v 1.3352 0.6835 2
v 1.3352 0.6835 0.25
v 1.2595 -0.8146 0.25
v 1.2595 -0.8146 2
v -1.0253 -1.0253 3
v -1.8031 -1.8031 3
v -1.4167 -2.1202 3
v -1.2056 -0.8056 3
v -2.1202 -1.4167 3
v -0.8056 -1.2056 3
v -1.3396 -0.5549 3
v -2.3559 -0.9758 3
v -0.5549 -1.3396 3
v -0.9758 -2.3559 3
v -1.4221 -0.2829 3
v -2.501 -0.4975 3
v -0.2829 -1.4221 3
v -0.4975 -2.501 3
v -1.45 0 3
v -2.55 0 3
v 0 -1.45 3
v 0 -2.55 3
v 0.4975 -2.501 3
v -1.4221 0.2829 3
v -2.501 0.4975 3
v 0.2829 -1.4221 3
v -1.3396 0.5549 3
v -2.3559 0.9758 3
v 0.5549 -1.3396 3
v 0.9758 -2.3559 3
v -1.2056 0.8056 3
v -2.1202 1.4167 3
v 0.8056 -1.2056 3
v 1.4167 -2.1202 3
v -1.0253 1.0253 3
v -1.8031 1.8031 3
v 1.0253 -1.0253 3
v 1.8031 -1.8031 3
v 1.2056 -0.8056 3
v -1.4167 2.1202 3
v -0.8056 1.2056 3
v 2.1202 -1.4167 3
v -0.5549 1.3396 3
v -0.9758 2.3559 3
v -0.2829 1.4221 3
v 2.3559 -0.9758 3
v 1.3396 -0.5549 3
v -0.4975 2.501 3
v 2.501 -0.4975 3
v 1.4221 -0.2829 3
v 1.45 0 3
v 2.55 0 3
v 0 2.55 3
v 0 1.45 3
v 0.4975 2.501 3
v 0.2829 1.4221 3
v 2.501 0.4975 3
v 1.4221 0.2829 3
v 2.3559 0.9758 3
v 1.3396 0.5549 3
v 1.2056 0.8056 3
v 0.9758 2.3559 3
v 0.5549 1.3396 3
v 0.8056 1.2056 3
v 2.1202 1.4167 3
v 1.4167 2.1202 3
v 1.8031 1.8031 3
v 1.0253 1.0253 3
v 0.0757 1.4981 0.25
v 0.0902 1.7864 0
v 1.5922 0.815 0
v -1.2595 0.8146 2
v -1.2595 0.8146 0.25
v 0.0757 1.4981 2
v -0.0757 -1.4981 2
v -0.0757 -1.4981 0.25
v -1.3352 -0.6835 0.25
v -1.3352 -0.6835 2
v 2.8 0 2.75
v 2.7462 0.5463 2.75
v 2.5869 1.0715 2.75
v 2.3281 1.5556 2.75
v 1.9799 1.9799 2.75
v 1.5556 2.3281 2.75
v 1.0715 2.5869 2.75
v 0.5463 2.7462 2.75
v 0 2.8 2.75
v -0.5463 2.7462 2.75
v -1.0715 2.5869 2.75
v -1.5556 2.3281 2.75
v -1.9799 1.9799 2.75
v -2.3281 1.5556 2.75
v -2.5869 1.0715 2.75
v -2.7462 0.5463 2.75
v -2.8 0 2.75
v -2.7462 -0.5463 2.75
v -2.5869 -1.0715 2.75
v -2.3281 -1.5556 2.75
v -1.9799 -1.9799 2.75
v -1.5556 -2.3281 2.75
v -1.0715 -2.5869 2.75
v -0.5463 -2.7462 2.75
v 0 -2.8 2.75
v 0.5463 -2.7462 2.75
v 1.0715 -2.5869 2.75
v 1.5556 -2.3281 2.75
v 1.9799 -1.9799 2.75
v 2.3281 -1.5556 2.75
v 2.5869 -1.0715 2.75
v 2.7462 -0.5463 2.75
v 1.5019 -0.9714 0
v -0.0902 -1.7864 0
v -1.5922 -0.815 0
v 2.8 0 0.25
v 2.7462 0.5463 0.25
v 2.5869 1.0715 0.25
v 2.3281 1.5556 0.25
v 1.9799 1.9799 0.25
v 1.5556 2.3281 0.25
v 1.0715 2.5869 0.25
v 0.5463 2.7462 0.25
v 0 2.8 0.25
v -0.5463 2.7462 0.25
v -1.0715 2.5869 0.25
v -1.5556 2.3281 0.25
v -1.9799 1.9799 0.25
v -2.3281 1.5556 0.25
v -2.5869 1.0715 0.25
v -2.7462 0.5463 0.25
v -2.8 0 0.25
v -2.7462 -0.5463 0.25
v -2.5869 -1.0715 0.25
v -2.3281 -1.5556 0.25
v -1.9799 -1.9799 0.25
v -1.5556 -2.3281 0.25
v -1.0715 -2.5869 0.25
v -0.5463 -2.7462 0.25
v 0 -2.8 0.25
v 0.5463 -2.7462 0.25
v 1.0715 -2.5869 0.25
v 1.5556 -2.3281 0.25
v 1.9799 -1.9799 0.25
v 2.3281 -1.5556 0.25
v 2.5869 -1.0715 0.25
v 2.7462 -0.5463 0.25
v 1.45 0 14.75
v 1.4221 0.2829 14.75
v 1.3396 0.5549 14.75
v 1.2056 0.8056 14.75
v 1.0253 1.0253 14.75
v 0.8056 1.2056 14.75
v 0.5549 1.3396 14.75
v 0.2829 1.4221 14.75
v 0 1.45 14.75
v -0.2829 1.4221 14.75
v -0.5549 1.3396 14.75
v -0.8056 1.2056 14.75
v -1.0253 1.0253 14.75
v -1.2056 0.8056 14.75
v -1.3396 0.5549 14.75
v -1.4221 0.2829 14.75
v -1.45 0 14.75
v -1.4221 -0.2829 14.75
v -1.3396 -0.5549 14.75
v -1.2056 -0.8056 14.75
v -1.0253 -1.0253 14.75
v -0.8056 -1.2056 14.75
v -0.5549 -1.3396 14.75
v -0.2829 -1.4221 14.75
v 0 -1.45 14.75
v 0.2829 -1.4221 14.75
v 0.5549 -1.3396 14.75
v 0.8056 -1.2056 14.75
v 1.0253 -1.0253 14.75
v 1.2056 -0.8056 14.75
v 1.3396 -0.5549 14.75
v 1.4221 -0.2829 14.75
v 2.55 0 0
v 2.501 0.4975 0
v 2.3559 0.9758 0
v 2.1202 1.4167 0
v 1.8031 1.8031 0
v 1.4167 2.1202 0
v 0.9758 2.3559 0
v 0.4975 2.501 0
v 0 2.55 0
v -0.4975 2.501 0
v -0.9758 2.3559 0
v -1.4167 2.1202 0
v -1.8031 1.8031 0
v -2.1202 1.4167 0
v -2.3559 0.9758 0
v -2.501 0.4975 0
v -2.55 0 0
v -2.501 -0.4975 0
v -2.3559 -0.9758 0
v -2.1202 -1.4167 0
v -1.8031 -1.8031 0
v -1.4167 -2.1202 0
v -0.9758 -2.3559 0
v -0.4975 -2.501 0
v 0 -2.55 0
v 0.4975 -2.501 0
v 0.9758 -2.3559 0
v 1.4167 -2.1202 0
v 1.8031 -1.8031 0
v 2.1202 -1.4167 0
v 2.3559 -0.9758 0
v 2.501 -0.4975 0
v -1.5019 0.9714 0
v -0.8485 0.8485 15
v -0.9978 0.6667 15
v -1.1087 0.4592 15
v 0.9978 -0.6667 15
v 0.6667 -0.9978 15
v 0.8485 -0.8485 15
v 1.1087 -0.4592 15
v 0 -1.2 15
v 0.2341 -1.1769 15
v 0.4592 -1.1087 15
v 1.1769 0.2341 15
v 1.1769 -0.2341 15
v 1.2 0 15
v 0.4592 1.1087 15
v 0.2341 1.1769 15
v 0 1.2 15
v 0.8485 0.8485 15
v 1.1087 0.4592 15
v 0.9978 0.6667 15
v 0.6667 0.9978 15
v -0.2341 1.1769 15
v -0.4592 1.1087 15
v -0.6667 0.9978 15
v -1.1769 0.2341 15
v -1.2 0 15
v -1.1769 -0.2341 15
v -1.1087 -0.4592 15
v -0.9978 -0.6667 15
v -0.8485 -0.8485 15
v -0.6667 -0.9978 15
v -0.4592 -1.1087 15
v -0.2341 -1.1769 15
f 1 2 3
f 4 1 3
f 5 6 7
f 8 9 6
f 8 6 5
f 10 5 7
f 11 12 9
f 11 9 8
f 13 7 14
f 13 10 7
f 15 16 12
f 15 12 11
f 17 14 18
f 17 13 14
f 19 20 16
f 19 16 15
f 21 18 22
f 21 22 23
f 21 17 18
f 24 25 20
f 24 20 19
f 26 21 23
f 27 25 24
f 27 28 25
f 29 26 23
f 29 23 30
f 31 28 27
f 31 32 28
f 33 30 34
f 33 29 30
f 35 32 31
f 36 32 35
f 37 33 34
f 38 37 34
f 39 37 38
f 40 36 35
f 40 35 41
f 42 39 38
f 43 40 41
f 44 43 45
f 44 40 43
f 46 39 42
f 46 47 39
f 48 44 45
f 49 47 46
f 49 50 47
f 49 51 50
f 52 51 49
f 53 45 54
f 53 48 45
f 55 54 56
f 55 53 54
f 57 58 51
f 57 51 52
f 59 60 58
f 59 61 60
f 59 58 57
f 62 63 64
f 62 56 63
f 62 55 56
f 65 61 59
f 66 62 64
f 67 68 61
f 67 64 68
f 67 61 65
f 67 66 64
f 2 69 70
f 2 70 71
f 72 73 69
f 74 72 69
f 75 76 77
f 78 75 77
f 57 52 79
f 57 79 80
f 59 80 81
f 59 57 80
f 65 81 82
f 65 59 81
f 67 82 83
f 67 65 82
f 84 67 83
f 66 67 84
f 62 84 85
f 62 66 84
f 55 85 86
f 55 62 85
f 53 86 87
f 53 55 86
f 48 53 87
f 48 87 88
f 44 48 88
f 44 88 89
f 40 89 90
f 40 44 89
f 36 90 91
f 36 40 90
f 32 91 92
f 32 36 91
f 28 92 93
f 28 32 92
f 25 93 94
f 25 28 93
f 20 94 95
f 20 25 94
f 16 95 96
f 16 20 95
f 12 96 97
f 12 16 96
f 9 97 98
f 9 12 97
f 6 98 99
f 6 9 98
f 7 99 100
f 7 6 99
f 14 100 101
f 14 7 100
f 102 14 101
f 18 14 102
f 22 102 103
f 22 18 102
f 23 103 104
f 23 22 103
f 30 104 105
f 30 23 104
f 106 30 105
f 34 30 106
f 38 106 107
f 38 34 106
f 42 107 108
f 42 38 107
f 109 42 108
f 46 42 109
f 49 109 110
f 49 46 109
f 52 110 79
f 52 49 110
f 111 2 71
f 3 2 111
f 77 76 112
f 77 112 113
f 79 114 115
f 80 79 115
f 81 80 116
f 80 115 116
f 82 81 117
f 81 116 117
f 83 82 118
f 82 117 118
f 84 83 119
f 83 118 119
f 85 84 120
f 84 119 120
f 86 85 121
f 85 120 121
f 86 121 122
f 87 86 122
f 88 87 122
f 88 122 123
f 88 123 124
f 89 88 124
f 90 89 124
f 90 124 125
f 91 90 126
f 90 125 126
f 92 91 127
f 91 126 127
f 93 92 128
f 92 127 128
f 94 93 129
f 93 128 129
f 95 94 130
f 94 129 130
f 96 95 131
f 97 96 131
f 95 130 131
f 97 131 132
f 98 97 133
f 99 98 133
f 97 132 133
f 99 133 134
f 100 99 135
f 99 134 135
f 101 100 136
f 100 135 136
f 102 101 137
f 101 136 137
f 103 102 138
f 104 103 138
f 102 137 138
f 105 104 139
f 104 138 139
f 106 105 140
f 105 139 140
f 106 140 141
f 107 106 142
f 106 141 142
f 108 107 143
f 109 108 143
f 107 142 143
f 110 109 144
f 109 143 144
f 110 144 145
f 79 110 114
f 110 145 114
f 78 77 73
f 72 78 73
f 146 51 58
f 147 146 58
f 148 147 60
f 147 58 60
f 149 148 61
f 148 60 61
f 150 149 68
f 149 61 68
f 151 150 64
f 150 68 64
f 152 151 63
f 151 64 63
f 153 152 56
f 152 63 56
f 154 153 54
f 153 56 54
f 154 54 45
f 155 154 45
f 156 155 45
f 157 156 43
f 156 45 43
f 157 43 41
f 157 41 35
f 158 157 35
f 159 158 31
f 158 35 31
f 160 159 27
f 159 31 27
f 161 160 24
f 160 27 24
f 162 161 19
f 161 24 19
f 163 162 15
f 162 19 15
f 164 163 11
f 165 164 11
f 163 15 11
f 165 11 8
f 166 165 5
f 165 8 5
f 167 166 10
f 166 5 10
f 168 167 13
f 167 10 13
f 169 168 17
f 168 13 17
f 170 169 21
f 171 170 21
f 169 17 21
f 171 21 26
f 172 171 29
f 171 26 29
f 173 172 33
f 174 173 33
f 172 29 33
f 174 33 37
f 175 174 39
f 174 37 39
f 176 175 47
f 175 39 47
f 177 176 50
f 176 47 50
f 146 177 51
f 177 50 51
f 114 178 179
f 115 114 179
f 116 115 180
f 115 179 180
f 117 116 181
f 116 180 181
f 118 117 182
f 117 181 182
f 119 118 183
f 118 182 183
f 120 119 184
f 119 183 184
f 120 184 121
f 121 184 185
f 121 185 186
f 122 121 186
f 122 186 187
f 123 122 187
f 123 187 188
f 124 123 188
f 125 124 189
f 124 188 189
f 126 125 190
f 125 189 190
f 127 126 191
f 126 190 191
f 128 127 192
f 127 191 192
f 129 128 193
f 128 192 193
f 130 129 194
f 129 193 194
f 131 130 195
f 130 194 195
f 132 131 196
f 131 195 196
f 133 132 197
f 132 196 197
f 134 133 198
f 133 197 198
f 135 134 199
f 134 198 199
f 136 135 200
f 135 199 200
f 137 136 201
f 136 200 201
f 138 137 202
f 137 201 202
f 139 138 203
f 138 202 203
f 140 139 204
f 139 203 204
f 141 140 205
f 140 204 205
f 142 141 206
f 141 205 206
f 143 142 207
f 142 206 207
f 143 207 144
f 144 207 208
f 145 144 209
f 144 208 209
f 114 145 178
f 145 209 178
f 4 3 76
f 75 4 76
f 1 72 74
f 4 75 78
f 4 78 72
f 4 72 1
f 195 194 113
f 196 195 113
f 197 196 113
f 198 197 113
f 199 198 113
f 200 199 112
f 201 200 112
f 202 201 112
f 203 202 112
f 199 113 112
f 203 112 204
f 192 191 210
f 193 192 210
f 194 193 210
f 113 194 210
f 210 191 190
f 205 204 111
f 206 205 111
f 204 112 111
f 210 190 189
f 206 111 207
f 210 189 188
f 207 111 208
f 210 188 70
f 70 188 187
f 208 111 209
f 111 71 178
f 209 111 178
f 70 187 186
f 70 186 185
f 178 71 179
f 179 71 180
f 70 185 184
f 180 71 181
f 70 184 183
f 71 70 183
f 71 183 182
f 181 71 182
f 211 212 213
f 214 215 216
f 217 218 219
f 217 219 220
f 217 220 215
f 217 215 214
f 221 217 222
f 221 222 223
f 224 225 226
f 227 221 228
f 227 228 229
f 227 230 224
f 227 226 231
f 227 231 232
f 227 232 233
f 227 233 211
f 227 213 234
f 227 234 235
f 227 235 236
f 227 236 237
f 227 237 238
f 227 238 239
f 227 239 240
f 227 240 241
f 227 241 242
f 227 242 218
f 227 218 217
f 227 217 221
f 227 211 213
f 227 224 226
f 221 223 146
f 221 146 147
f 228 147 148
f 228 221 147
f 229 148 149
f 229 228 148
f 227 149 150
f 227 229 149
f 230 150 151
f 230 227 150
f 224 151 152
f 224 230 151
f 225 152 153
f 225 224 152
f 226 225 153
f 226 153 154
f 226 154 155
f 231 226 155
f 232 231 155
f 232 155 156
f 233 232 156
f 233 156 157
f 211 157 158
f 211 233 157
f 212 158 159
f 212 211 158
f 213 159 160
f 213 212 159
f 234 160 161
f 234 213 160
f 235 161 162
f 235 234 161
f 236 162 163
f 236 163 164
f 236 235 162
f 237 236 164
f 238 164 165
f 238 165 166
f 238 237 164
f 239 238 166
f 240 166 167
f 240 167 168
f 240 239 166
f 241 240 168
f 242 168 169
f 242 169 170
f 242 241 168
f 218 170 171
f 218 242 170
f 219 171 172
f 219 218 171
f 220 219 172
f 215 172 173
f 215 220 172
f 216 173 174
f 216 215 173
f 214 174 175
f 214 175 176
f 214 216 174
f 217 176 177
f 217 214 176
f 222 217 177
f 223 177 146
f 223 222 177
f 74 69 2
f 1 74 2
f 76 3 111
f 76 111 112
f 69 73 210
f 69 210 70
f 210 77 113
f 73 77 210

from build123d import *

# Parameters (mm, degrees)
SKETCH_R     = 2.8
PAD_DEPTH    = 3
SKETCH001_R  = 1.45
PAD001_DEPTH = 12
POCKET_DEPTH = 2
CHAMFER_SIZE = 0.25


with BuildPart() as part:
    # Sketch → Pad (new body)
    with BuildSketch(Plane.XY):
        Circle(SKETCH_R)
    extrude(amount=PAD_DEPTH)

    # Sketch001 (on Face3 of Pad) → Pad001 (join)
    with BuildSketch(Plane.XY.offset(3)):
        Circle(SKETCH001_R)
    extrude(amount=PAD001_DEPTH)

    # Sketch002 (on Face2 of Pad001) → Pocket (cut)
    with BuildSketch(Plane(origin=(0, 0, 0), x_dir=(1, 0, 0), z_dir=(0, 0, -1))):
        Polygon((1.259542, 0.814588), (-0.075682, 1.49809), (-1.335225, 0.683502), (-1.259542, -0.814588), (0.075682, -1.49809), (1.335225, -0.683502), align=None)
    extrude(amount=-POCKET_DEPTH, mode=Mode.SUBTRACT)

    # Chamfer
    chamfer_edges = [part.edges().sort_by_distance(p)[0] for p in [
        (-2.8, 0, 3),
        (-2.8, 0, 0),
        (1.297384, -0.065543, 0),
        (0.705454, 1.090796, 0),
        (-0.59193, 1.156339, 0),
        (-1.297384, 0.065543, 0),
        (-0.705454, -1.090796, 0),
        (0.59193, -1.156339, 0),
        (-1.45, 0, 15),
    ]]
    chamfer(chamfer_edges, length=CHAMFER_SIZE)


solid = part.part
